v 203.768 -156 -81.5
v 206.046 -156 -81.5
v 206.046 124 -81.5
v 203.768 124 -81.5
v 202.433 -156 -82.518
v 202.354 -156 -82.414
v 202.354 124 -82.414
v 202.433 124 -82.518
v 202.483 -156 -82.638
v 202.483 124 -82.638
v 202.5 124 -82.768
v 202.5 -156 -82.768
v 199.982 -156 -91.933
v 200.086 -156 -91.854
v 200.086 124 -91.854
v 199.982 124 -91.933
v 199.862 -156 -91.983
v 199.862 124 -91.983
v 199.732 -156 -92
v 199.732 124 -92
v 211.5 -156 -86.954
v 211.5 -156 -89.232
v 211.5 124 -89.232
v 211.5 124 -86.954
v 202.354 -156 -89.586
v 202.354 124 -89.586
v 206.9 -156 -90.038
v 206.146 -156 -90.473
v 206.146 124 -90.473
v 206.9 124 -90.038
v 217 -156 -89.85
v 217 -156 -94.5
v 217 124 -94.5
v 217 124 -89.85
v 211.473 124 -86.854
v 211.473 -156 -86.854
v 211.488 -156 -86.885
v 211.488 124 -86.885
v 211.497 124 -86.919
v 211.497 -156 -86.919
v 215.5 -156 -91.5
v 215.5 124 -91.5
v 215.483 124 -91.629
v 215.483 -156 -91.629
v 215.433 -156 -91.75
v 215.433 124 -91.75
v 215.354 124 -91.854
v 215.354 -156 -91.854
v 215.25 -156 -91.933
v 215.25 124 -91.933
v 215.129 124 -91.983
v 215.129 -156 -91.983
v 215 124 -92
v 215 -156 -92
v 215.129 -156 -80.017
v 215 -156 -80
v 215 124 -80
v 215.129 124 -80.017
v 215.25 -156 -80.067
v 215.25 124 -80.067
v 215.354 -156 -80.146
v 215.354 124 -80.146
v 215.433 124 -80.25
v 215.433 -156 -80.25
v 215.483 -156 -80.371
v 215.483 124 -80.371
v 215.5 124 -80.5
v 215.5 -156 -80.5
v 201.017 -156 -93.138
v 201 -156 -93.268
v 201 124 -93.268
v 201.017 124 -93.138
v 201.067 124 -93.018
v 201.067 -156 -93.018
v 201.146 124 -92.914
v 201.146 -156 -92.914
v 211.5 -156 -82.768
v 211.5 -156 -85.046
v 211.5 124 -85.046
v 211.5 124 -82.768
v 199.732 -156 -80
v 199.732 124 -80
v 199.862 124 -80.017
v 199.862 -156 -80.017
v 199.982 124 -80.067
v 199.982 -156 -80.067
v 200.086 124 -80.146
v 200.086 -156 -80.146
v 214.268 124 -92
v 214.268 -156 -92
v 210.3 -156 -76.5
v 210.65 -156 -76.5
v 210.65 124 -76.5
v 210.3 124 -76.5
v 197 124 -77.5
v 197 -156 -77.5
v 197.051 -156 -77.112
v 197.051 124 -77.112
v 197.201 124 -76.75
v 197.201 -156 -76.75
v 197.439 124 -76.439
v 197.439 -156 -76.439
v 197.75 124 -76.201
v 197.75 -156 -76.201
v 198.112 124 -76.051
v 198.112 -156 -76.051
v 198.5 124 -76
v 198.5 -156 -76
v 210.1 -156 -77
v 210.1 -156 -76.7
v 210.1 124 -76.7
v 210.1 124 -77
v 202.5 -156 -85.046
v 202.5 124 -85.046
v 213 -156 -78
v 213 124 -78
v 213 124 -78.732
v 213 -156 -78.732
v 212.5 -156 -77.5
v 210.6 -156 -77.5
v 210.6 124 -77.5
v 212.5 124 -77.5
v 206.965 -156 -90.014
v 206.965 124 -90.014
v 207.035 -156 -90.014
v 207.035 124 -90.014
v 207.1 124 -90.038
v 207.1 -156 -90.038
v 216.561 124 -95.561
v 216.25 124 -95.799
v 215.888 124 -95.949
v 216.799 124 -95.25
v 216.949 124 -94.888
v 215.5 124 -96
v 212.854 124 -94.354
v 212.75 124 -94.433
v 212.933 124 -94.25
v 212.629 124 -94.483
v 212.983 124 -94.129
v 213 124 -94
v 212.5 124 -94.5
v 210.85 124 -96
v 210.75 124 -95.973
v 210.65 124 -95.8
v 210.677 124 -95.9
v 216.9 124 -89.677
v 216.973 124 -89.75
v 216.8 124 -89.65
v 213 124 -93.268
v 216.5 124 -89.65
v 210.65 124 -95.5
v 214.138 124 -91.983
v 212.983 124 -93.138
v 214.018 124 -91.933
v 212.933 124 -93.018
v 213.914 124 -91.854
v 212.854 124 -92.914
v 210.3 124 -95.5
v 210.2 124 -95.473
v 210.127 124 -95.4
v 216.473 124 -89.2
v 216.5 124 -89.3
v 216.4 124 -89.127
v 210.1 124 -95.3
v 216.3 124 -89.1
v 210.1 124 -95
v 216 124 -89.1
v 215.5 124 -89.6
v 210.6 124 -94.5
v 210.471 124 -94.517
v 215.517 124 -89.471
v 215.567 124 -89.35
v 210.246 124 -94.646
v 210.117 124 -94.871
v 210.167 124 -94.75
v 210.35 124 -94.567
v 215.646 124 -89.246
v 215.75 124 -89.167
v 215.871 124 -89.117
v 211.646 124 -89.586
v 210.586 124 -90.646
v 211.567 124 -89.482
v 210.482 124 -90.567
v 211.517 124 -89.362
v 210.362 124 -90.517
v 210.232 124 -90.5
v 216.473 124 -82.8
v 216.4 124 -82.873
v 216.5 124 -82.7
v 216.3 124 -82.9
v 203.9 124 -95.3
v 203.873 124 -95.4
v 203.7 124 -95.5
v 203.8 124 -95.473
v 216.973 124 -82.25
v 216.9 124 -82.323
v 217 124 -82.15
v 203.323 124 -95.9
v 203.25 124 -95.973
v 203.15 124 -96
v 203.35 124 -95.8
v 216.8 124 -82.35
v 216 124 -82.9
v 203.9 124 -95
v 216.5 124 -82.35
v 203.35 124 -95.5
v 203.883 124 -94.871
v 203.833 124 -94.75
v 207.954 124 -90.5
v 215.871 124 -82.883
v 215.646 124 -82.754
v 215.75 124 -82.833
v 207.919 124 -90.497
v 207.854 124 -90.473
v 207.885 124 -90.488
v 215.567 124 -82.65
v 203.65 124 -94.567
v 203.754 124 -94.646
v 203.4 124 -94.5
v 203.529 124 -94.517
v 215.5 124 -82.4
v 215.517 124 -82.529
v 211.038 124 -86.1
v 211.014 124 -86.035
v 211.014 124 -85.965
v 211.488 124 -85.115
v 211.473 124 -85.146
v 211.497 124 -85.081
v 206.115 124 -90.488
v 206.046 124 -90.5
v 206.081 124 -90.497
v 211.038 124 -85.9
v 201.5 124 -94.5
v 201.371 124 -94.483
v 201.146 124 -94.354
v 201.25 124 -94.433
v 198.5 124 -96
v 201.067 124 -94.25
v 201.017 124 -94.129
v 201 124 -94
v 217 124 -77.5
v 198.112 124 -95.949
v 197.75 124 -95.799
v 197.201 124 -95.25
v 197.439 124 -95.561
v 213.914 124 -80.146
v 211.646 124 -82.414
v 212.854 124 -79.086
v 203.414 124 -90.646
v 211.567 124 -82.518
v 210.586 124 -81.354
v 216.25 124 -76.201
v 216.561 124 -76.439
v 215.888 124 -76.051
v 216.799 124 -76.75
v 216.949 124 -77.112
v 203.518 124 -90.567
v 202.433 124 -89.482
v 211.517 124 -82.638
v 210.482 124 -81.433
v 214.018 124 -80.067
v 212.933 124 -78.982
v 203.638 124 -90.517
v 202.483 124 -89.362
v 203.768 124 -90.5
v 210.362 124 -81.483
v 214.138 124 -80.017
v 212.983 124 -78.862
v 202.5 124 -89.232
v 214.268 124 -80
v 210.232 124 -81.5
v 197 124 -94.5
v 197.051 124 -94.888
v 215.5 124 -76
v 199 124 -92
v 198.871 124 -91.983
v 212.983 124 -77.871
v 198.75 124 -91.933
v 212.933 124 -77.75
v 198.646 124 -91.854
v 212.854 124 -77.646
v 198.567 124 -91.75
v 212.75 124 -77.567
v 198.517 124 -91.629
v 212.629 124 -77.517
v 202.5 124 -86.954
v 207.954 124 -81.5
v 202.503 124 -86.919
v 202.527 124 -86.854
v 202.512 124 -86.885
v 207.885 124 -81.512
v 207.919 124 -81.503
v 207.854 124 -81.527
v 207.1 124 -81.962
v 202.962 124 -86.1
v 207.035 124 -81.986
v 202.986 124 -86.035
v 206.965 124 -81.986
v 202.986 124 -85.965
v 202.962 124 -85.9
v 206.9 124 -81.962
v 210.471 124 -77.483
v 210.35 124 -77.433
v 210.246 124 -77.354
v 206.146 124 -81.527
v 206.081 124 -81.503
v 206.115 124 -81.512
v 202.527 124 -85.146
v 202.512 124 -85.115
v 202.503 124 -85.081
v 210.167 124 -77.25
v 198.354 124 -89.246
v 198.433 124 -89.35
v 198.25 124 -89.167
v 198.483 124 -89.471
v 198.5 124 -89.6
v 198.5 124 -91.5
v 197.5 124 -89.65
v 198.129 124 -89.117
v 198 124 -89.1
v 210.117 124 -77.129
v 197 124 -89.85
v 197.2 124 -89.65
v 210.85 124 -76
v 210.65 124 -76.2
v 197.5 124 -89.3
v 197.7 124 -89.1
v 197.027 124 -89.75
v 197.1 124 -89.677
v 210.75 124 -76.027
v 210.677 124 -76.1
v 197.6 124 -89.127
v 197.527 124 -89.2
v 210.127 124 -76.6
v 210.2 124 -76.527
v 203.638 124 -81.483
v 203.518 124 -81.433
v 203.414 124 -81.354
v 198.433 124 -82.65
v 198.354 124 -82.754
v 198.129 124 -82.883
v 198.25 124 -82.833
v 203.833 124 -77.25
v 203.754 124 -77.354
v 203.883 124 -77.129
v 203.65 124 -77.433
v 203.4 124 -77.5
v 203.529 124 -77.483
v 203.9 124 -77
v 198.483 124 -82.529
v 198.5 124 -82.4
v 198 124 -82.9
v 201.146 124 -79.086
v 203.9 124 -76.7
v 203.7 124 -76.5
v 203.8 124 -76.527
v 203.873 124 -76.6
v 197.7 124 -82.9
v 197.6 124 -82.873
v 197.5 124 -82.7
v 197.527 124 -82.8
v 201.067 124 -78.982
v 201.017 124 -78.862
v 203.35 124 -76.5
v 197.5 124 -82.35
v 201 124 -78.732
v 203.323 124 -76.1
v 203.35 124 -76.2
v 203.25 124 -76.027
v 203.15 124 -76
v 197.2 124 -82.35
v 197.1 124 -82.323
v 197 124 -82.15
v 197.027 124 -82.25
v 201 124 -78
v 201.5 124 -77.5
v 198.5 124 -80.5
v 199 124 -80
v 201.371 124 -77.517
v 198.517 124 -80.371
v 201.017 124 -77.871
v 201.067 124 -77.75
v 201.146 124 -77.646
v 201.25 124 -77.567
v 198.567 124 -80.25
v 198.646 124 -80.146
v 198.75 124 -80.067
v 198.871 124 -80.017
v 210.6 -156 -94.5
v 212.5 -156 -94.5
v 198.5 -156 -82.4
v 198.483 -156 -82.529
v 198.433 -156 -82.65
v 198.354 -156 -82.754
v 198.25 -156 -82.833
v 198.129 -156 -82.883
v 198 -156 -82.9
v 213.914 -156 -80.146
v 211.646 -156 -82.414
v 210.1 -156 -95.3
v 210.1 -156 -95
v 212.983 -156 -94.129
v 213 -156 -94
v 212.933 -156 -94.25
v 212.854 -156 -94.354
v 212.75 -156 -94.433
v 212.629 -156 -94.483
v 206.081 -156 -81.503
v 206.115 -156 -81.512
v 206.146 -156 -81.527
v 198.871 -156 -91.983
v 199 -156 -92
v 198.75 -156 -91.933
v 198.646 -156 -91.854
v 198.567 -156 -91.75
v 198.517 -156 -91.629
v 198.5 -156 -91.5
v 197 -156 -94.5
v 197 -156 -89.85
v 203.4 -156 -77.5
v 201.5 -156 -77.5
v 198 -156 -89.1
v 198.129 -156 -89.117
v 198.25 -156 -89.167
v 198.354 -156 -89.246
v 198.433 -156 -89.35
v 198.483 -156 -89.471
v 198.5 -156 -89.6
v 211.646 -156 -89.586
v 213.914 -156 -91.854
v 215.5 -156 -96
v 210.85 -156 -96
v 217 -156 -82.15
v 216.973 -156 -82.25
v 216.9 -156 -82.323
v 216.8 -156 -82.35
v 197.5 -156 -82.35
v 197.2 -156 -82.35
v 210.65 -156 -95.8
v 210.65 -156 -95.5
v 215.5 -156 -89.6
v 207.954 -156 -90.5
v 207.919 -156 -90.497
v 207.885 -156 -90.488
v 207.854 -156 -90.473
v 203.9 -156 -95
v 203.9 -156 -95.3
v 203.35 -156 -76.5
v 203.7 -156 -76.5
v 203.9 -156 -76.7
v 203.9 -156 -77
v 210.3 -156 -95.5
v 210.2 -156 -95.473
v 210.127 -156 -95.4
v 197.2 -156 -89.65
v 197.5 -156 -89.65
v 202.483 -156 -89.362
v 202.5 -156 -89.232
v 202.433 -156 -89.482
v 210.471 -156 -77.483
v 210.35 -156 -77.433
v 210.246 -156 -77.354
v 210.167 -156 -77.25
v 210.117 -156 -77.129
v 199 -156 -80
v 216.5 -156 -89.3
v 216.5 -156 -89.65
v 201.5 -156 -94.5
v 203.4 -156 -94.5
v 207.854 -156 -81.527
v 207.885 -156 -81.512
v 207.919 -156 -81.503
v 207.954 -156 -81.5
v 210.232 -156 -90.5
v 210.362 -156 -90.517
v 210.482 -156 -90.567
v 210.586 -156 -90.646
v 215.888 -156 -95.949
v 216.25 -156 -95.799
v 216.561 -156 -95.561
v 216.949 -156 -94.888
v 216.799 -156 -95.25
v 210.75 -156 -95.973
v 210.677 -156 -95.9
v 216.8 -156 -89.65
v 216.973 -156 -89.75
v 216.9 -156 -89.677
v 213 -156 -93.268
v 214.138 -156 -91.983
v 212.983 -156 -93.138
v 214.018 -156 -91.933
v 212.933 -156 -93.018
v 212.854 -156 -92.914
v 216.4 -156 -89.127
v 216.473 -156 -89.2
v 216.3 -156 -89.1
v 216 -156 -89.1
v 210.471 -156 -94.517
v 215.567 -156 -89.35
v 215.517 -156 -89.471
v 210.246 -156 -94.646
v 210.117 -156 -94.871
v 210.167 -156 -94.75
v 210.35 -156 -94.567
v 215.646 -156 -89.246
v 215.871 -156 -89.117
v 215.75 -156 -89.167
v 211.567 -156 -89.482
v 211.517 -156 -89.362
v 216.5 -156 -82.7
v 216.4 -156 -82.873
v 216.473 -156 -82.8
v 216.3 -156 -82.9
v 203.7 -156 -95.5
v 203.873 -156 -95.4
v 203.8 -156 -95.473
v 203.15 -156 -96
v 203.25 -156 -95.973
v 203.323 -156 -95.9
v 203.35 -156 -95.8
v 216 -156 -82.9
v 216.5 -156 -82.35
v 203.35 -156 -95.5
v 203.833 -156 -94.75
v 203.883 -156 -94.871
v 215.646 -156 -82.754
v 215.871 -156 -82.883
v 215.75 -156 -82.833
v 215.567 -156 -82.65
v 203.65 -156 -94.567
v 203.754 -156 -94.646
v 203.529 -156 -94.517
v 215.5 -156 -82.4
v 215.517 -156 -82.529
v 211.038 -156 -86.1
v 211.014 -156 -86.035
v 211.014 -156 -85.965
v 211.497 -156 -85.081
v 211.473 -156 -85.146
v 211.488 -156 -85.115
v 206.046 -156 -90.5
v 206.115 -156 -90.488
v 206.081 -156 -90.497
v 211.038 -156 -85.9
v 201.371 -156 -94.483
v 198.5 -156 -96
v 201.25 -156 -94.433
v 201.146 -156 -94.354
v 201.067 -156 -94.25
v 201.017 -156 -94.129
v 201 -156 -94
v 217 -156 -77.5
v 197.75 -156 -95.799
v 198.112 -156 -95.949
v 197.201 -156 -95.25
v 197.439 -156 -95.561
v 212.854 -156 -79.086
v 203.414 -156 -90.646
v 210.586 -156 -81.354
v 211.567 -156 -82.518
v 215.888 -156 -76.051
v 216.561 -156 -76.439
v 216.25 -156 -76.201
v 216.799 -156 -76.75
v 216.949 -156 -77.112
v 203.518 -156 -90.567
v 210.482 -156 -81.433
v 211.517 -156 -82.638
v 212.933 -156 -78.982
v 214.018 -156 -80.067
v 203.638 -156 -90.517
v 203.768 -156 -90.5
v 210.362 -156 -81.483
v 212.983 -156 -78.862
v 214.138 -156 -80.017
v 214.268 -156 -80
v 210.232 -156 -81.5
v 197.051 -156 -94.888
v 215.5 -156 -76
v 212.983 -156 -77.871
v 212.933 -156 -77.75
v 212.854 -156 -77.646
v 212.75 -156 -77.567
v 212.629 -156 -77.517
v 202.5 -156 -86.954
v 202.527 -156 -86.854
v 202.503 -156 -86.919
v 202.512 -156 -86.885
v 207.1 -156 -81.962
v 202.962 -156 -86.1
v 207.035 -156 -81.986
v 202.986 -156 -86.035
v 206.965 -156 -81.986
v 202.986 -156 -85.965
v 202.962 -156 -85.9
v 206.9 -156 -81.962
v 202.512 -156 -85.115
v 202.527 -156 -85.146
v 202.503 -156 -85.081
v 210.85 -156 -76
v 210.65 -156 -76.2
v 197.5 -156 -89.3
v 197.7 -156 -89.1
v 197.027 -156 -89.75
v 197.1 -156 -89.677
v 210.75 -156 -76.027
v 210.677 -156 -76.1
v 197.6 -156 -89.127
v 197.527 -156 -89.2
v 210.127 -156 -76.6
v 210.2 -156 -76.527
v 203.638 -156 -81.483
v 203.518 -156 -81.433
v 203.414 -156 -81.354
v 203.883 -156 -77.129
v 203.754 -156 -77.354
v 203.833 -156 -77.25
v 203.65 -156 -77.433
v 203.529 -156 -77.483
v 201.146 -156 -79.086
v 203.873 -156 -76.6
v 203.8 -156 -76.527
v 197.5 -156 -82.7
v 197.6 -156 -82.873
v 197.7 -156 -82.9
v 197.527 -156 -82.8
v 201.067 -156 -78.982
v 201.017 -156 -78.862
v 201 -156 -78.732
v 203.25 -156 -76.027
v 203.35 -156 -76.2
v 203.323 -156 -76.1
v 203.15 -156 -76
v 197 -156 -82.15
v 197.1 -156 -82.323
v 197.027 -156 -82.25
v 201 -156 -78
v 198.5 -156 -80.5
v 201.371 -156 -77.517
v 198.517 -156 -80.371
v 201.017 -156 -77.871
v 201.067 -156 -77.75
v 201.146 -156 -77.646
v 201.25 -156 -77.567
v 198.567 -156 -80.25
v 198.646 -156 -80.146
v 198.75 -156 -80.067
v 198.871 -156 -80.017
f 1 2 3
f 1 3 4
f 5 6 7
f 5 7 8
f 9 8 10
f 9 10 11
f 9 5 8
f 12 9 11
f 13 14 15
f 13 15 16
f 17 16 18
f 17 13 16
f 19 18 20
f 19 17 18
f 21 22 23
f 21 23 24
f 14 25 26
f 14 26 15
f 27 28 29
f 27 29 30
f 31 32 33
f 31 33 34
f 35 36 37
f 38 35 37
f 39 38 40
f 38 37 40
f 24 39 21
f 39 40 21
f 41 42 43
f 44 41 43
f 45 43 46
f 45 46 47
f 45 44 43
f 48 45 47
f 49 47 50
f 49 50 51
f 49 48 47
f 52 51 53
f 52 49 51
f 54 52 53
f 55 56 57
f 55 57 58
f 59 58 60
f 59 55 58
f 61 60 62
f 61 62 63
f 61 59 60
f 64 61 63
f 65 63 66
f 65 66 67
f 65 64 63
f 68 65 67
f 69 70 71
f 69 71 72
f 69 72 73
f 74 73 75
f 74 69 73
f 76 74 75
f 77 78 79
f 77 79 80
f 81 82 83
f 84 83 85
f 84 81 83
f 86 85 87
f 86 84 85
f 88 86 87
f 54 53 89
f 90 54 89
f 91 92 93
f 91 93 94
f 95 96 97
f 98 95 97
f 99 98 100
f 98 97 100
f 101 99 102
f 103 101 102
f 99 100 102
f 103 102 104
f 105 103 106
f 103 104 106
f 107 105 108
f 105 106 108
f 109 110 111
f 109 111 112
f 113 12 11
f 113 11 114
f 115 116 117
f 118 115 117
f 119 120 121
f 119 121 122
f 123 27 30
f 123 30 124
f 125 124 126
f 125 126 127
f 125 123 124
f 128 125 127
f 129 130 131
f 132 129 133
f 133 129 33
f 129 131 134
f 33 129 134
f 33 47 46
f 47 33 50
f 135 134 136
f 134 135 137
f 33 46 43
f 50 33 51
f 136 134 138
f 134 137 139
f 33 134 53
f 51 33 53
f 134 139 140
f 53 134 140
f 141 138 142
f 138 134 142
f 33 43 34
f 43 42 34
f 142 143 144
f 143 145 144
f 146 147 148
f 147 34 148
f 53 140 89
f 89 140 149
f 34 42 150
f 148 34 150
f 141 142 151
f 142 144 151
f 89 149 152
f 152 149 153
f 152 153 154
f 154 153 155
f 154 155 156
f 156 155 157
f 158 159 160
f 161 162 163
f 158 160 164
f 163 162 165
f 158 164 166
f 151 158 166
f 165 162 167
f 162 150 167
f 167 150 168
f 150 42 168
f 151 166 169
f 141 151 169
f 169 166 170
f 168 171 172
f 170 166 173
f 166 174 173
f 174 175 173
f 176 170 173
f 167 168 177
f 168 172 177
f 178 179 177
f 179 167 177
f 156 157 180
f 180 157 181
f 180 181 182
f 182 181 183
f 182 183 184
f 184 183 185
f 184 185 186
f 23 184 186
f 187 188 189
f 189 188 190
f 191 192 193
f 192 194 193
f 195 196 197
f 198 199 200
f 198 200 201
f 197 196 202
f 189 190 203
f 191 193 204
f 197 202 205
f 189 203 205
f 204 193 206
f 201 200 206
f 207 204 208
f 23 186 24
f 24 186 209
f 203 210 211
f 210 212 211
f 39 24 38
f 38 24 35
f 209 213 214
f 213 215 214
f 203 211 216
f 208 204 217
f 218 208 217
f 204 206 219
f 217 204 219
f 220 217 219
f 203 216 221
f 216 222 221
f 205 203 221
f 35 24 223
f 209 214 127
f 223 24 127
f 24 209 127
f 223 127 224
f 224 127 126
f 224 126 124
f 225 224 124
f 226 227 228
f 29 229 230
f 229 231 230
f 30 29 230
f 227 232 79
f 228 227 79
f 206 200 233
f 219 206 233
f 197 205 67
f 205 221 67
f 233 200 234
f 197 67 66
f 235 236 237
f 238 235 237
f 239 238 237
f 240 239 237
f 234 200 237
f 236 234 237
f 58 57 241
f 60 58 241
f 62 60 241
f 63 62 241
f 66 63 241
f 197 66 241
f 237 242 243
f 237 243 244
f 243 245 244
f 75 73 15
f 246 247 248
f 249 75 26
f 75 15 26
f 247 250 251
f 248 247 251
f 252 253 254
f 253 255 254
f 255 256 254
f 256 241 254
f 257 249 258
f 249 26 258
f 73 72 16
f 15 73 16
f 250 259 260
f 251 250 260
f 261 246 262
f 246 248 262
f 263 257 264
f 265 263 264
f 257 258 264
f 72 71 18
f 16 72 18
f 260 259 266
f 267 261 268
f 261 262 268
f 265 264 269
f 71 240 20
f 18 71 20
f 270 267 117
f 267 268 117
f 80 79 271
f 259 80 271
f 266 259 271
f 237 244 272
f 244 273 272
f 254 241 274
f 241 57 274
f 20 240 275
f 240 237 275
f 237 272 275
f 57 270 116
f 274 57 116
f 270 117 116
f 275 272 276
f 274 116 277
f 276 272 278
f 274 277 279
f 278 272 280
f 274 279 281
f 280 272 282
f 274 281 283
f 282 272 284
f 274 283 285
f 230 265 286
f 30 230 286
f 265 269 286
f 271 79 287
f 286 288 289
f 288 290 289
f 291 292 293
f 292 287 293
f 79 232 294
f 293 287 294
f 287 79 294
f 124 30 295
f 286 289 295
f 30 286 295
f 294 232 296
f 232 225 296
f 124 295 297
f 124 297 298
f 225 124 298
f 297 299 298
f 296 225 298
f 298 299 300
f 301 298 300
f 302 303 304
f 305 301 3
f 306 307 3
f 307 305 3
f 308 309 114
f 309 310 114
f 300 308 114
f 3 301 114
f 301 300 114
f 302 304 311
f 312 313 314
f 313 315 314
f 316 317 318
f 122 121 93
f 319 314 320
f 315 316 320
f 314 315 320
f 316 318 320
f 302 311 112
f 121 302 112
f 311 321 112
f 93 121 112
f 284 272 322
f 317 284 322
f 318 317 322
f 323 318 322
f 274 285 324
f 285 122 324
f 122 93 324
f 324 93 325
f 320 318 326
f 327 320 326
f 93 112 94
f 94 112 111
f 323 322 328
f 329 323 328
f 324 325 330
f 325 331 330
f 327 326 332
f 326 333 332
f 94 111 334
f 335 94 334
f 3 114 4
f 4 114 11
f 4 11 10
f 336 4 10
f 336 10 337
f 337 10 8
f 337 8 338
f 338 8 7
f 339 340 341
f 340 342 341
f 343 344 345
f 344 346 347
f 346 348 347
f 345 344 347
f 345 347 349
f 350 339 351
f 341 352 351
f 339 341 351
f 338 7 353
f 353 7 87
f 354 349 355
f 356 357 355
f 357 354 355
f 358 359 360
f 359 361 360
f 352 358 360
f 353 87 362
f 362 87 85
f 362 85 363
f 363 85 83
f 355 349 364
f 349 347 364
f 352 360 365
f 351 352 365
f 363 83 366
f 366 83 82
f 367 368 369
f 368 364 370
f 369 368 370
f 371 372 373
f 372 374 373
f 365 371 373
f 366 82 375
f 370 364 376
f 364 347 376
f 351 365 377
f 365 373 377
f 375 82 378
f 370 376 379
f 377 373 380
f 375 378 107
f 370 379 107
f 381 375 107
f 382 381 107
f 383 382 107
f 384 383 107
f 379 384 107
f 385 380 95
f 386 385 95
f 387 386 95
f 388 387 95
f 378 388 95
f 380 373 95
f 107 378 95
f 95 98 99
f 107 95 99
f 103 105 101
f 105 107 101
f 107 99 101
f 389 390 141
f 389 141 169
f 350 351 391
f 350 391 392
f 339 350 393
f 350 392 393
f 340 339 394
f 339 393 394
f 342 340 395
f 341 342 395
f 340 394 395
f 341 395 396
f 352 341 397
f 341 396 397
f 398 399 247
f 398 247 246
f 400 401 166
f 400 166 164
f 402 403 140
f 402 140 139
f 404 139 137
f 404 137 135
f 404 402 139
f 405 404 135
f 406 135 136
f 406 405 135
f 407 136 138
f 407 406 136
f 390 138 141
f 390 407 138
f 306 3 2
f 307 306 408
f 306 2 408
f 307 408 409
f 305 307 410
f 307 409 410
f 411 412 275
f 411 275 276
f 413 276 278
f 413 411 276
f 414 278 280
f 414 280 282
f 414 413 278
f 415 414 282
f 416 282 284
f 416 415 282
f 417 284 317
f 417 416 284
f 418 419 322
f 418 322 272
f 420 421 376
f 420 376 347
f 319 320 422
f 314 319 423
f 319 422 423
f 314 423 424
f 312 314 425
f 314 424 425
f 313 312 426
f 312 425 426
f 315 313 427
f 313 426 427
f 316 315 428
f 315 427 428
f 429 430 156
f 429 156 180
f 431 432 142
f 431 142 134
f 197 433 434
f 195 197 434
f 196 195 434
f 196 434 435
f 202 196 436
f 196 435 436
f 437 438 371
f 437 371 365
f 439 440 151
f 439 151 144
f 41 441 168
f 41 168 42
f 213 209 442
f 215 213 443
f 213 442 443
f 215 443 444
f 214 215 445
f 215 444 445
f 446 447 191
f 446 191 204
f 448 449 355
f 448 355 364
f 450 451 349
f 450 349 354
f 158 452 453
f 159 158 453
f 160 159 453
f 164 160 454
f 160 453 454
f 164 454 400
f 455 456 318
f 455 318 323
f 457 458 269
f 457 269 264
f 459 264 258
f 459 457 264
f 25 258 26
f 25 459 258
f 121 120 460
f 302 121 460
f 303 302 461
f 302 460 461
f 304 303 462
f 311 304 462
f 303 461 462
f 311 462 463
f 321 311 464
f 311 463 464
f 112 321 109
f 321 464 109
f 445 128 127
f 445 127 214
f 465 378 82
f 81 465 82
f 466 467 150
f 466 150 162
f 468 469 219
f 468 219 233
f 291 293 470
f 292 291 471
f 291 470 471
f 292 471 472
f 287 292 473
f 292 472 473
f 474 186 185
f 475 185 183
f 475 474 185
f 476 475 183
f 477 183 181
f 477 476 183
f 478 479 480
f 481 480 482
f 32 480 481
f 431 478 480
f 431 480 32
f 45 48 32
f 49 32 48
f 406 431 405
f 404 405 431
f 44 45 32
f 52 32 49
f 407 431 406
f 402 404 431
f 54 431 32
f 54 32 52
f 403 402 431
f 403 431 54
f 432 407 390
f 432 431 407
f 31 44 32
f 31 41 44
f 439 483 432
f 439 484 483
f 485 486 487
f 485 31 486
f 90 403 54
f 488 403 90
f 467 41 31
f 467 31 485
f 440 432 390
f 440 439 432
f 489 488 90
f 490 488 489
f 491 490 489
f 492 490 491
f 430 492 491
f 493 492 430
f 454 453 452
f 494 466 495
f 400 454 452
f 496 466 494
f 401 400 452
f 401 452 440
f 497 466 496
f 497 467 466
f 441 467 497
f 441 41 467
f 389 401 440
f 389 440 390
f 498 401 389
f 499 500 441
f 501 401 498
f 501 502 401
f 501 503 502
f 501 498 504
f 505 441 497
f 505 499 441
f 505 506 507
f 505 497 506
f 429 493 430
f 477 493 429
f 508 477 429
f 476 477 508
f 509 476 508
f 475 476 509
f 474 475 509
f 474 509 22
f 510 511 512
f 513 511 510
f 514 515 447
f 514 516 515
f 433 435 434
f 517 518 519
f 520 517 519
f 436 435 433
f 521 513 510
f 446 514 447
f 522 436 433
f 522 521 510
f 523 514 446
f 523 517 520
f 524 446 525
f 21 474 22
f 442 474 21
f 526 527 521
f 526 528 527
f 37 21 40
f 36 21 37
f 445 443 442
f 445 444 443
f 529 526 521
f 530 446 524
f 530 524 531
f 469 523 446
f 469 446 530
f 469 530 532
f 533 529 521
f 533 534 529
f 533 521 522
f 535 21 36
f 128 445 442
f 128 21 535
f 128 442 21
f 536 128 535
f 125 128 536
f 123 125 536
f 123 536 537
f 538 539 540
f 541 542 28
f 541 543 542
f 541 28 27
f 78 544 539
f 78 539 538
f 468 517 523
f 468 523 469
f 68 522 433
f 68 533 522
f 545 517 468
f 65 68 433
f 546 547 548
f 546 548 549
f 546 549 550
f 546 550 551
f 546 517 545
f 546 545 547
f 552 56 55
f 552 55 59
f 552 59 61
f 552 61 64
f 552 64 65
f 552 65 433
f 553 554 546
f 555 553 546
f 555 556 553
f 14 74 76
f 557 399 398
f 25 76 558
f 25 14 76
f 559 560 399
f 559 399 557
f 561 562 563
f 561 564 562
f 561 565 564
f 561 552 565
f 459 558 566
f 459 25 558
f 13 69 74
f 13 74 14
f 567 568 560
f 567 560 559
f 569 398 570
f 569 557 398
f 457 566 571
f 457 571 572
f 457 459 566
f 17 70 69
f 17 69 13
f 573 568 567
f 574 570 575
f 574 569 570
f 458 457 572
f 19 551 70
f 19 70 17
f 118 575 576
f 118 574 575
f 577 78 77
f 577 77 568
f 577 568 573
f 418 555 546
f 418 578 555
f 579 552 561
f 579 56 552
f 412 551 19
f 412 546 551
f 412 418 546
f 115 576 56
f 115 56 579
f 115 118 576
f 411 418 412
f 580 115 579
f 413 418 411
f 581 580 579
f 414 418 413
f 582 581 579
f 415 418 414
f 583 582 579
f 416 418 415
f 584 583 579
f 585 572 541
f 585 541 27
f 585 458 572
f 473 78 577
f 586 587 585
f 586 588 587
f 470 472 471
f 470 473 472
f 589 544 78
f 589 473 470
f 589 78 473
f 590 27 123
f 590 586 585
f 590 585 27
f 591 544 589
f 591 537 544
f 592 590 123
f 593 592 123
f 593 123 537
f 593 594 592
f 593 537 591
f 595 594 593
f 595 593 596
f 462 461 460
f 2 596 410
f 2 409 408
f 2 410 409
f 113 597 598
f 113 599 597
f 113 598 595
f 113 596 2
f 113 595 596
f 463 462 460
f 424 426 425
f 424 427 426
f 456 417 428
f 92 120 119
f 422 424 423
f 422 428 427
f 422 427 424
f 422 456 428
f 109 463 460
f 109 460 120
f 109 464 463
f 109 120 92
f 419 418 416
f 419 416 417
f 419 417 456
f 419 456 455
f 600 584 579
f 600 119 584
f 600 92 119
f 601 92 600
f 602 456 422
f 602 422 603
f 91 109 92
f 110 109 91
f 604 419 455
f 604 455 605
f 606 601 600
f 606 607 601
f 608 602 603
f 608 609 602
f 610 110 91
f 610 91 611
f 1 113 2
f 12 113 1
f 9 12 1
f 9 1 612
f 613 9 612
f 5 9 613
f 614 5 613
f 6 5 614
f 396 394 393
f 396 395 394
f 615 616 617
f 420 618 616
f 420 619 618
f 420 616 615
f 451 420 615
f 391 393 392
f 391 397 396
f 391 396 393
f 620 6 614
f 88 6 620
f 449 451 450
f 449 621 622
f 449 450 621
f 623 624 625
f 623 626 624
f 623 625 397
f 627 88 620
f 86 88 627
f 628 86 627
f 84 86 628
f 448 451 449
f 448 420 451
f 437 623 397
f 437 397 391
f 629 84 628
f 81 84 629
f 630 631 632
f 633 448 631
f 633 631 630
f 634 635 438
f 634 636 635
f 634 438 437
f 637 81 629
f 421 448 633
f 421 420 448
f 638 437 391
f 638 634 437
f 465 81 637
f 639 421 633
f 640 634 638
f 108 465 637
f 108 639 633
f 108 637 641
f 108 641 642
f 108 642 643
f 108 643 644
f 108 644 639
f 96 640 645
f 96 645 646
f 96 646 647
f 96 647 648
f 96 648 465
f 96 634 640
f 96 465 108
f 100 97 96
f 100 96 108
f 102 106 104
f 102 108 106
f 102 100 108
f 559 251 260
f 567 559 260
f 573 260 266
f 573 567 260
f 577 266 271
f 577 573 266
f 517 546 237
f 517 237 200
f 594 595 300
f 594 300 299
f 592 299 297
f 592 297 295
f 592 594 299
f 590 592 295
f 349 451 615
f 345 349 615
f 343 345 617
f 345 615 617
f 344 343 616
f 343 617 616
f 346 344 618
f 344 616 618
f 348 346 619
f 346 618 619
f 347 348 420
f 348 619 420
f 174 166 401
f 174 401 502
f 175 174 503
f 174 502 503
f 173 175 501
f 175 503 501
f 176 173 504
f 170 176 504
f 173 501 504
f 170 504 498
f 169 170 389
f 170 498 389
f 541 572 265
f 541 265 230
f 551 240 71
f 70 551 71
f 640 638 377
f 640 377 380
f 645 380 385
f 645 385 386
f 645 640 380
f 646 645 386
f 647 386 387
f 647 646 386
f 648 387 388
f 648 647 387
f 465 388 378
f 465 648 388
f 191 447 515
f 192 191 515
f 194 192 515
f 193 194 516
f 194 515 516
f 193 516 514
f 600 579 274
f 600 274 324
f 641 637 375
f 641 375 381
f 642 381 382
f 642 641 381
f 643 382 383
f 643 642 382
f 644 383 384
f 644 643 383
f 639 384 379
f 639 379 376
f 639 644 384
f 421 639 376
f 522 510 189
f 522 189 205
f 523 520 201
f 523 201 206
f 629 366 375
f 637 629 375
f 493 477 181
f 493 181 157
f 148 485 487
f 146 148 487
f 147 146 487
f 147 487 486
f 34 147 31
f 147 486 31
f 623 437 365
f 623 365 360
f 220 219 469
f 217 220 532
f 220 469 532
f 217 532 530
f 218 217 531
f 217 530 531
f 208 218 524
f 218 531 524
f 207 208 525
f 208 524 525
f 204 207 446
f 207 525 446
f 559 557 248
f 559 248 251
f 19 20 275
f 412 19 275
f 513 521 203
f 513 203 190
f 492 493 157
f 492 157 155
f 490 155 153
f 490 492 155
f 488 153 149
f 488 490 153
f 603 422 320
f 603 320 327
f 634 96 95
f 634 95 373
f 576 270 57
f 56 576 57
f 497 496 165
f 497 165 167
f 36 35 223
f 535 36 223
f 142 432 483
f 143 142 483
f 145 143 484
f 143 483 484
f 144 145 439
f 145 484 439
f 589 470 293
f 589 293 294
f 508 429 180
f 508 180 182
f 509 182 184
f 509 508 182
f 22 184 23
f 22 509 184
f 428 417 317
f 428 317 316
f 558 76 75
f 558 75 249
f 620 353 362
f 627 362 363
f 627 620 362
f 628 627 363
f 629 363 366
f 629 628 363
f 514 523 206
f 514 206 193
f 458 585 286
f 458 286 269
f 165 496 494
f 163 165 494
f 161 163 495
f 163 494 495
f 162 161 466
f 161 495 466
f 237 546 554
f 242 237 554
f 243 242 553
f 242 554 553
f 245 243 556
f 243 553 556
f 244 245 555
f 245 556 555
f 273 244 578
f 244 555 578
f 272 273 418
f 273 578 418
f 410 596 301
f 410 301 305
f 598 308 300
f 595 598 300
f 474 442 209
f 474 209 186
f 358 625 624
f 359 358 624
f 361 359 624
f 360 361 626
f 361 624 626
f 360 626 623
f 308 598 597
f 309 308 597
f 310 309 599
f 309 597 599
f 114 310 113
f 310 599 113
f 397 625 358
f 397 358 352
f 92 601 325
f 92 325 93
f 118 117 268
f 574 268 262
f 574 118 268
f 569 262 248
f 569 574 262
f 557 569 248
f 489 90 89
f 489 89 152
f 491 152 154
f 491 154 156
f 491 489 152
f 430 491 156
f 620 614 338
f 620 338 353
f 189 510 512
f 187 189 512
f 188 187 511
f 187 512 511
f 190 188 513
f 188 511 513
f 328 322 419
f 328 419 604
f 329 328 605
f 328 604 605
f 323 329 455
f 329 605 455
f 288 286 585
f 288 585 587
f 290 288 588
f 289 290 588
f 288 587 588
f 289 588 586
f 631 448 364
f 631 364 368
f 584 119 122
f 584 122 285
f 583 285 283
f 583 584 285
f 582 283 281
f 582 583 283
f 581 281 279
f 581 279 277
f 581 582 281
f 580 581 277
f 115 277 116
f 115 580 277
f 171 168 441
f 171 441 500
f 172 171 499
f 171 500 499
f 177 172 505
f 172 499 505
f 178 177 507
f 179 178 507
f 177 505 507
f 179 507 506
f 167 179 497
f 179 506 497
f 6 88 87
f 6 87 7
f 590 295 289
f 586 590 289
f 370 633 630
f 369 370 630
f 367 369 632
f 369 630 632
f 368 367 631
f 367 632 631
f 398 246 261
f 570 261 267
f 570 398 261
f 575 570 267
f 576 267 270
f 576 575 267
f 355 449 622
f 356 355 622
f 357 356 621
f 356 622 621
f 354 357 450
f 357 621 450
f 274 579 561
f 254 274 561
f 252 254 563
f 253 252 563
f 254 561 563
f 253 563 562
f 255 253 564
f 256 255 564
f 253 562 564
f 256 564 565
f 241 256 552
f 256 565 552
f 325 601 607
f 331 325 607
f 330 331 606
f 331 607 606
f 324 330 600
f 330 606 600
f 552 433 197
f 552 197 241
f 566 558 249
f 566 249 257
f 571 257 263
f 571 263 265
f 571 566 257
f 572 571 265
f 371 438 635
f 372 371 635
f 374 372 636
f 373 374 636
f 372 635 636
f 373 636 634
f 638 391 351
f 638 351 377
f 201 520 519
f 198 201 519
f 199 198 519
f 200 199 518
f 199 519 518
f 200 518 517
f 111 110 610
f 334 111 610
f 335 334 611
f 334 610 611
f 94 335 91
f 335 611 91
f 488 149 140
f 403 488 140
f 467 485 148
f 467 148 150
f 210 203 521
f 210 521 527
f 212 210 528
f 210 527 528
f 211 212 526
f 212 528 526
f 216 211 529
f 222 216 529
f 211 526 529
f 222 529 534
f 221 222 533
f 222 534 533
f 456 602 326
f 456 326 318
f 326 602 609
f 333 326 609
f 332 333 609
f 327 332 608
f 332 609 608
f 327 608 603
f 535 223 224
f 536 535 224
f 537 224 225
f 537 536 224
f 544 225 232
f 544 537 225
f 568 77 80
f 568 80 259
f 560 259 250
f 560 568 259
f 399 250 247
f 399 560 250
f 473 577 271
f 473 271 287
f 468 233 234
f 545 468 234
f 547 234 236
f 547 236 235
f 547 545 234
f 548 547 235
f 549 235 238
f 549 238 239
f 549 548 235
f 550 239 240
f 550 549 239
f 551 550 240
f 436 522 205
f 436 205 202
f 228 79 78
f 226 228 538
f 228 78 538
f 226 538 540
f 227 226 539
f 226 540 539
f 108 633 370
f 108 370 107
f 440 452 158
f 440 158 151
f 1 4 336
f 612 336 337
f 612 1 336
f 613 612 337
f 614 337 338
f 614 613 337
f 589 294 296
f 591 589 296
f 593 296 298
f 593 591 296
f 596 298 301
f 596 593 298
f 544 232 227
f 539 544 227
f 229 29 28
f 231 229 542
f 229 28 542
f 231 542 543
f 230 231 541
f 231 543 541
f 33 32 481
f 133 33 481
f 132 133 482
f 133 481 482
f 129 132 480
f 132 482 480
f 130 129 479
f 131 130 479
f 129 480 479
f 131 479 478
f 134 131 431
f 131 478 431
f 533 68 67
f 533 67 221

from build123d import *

# Parameters (mm, degrees)
PAD007_DEPTH    = 280
POCKET019_DEPTH = 280.001


with BuildPart() as pad007:
    # Sketch015 → Pad007 (new body)
    with BuildSketch(Plane(origin=(0, 0, -1.5), x_dir=(0, 0, -1), z_dir=(0, 1, 0))):
        with BuildLine():
            Line((0, 20), (4.65, 20))
            ThreePointArc((4.85, 19.8), (4.791421, 19.941421), (4.65, 20))
            Line((4.85, 19.8), (4.85, 19.5))
            Line((4.85, 19.5), (5.2, 19.5))
            ThreePointArc((5.4, 19.3), (5.341421, 19.441421), (5.2, 19.5))
            Line((5.4, 19.3), (5.4, 19))
            ThreePointArc((4.9, 18.5), (5.253553, 18.646446), (5.4, 19))
            Line((4.9, 18.5), (2.999999, 18.5))
            ThreePointArc((2.999999, 18.5), (2.646446, 18.353553), (2.499999, 18))
            Line((2.499999, 18), (2.499999, 17.267767))
            ThreePointArc((2.499999, 17.267767), (2.53806, 17.076425), (2.646446, 16.914213))
            Line((2.646446, 16.914213), (4.914213, 14.646447))
            ThreePointArc((4.914213, 14.646447), (5.076424, 14.53806), (5.267766, 14.5))
            Line((5.267766, 14.5), (7.54641, 14.5))
            ThreePointArc((7.64641, 14.473205), (7.598173, 14.493185), (7.54641, 14.5))
            Line((7.64641, 14.473205), (8.4, 14.03812))
            ThreePointArc((8.4, 14.03812), (8.5, 14.011325), (8.6, 14.03812))
            Line((8.6, 14.03812), (9.35359, 14.473205))
            ThreePointArc((9.45359, 14.5), (9.401827, 14.493185), (9.35359, 14.473205))
            Line((9.45359, 14.5), (11.732234, 14.5))
            ThreePointArc((11.732234, 14.5), (11.923576, 14.53806), (12.085787, 14.646447))
            Line((12.085787, 14.646447), (14.353554, 16.914213))
            ThreePointArc((14.353554, 16.914213), (14.46194, 17.076425), (14.500001, 17.267767))
            Line((14.500001, 17.267767), (14.500001, 18))
            ThreePointArc((14.500001, 18), (14.353554, 18.353553), (14.000001, 18.5))
            Line((14.000001, 18.5), (12.1, 18.5))
            ThreePointArc((11.6, 19), (11.746447, 18.646446), (12.1, 18.5))
            Line((11.6, 19), (11.6, 19.3))
            ThreePointArc((11.8, 19.5), (11.658579, 19.441421), (11.6, 19.3))
            Line((11.8, 19.5), (12.15, 19.5))
            Line((12.15, 19.5), (12.15, 19.8))
            ThreePointArc((12.35, 20), (12.208579, 19.941421), (12.15, 19.8))
            Line((12.35, 20), (17, 20))
            ThreePointArc((18.5, 18.5), (18.06066, 19.56066), (17, 20))
            Line((18.5, 18.5), (18.5, 13.85))
            ThreePointArc((18.3, 13.65), (18.441421, 13.708578), (18.5, 13.85))
            Line((18.3, 13.65), (18, 13.65))
            Line((18, 13.65), (18, 13.3))
            ThreePointArc((17.8, 13.1), (17.941421, 13.158579), (18, 13.3))
            Line((17.8, 13.1), (17.5, 13.1))
            ThreePointArc((17, 13.6), (17.146446, 13.246447), (17.5, 13.1))
            Line((17, 13.6), (17, 15.5))
            ThreePointArc((17, 15.5), (16.853553, 15.853553), (16.5, 16))
            Line((16.5, 16), (15.767767, 16))
            ThreePointArc((15.767767, 16), (15.576425, 15.961939), (15.414213, 15.853553))
            Line((15.414213, 15.853553), (13.146446, 13.585786))
            ThreePointArc((13.146446, 13.585786), (13.03806, 13.423574), (13, 13.232233))
            Line((13, 13.232233), (13, 10.953589))
            ThreePointArc((12.973205, 10.853589), (12.993185, 10.901825), (13, 10.953589))
            Line((12.973205, 10.853589), (12.53812, 10.1))
            ThreePointArc((12.53812, 10.1), (12.511325, 10), (12.53812, 9.9))
            Line((12.53812, 9.9), (12.973205, 9.146411))
            ThreePointArc((13, 9.046411), (12.993185, 9.098175), (12.973205, 9.146411))
            Line((13, 9.046411), (13, 6.767767))
            ThreePointArc((13, 6.767767), (13.03806, 6.576426), (13.146446, 6.414214))
            Line((13.146446, 6.414214), (15.414213, 4.146447))
            ThreePointArc((15.414213, 4.146447), (15.576425, 4.038061), (15.767767, 4))
            Line((15.767767, 4), (16.5, 4))
            ThreePointArc((16.5, 4), (16.853553, 4.146447), (17, 4.5))
            Line((17, 4.5), (17, 6.4))
            ThreePointArc((17.5, 6.9), (17.146446, 6.753553), (17, 6.4))
            Line((17.5, 6.9), (17.8, 6.9))
            ThreePointArc((18, 6.7), (17.941421, 6.841421), (17.8, 6.9))
            Line((18, 6.7), (18, 6.35))
            Line((18, 6.35), (18.3, 6.35))
            ThreePointArc((18.5, 6.15), (18.441421, 6.291422), (18.3, 6.35))
            Line((18.5, 6.15), (18.5, 1.5))
            ThreePointArc((17, 0), (18.06066, 0.43934), (18.5, 1.5))
            Line((17, 0), (12.35, 0))
            ThreePointArc((12.15, 0.2), (12.208579, 0.058579), (12.35, 0))
            Line((12.15, 0.2), (12.15, 0.5))
            Line((12.15, 0.5), (11.8, 0.5))
            ThreePointArc((11.6, 0.7), (11.658579, 0.558579), (11.8, 0.5))
            Line((11.6, 0.7), (11.6, 1))
            ThreePointArc((12.1, 1.5), (11.746447, 1.353554), (11.6, 1))
            Line((12.1, 1.5), (14.000001, 1.5))
            ThreePointArc((14.000001, 1.5), (14.353554, 1.646447), (14.500001, 2))
            Line((14.500001, 2), (14.500001, 2.732233))
            ThreePointArc((14.500001, 2.732233), (14.46194, 2.923575), (14.353554, 3.085787))
            Line((14.353554, 3.085787), (12.085787, 5.353553))
            ThreePointArc((12.085787, 5.353553), (11.923576, 5.46194), (11.732234, 5.5))
            Line((11.732234, 5.5), (9.45359, 5.5))
            ThreePointArc((9.35359, 5.526795), (9.401827, 5.506815), (9.45359, 5.5))
            Line((9.35359, 5.526795), (8.6, 5.96188))
            ThreePointArc((8.6, 5.96188), (8.5, 5.988675), (8.4, 5.96188))
            Line((8.4, 5.96188), (7.64641, 5.526795))
            ThreePointArc((7.54641, 5.5), (7.598173, 5.506815), (7.64641, 5.526795))
            Line((7.54641, 5.5), (5.267766, 5.5))
            ThreePointArc((5.267766, 5.5), (5.076424, 5.46194), (4.914213, 5.353553))
            Line((4.914213, 5.353553), (2.646446, 3.085787))
            ThreePointArc((2.646446, 3.085787), (2.53806, 2.923575), (2.499999, 2.732233))
            Line((2.499999, 2.732233), (2.499999, 2))
            ThreePointArc((2.499999, 2), (2.646446, 1.646447), (2.999999, 1.5))
            Line((2.999999, 1.5), (4.9, 1.5))
            ThreePointArc((5.4, 1), (5.253553, 1.353554), (4.9, 1.5))
            Line((5.4, 1), (5.4, 0.7))
            ThreePointArc((5.2, 0.5), (5.341421, 0.558579), (5.4, 0.7))
            Line((5.2, 0.5), (4.85, 0.5))
            Line((4.85, 0.5), (4.85, 0.2))
            ThreePointArc((4.65, 0), (4.791421, 0.058579), (4.85, 0.2))
            Line((4.65, 0), (0, 0))
            ThreePointArc((-1.5, 1.5), (-1.06066, 0.43934), (0, 0))
            Line((-1.5, 1.5), (-1.5, 6.15))
            ThreePointArc((-1.3, 6.35), (-1.441421, 6.291422), (-1.5, 6.15))
            Line((-1.3, 6.35), (-1, 6.35))
            Line((-1, 6.35), (-1, 6.7))
            ThreePointArc((-0.8, 6.9), (-0.941421, 6.841421), (-1, 6.7))
            Line((-0.8, 6.9), (-0.5, 6.9))
            ThreePointArc((0, 6.4), (-0.146446, 6.753553), (-0.5, 6.9))
            Line((0, 6.4), (0, 4.5))
            ThreePointArc((0, 4.5), (0.146447, 4.146447), (0.5, 4))
            Line((0.5, 4), (1.232233, 4))
            ThreePointArc((1.232233, 4), (1.423575, 4.038061), (1.585787, 4.146447))
            Line((1.585787, 4.146447), (3.853554, 6.414214))
            ThreePointArc((3.853554, 6.414214), (3.96194, 6.576426), (4, 6.767767))
            Line((4, 6.767767), (4, 9.046411))
            ThreePointArc((4.026795, 9.146411), (4.006815, 9.098175), (4, 9.046411))
            Line((4.026795, 9.146411), (4.46188, 9.9))
            ThreePointArc((4.46188, 9.9), (4.488675, 10), (4.46188, 10.1))
            Line((4.46188, 10.1), (4.026795, 10.853589))
            ThreePointArc((4, 10.953589), (4.006815, 10.901825), (4.026795, 10.853589))
            Line((4, 10.953589), (4, 13.232233))
            ThreePointArc((4, 13.232233), (3.96194, 13.423574), (3.853554, 13.585786))
            Line((3.853554, 13.585786), (1.585787, 15.853553))
            ThreePointArc((1.585787, 15.853553), (1.423575, 15.961939), (1.232233, 16))
            Line((1.232233, 16), (0.5, 16))
            ThreePointArc((0.5, 16), (0.146447, 15.853553), (0, 15.5))
            Line((0, 15.5), (0, 13.6))
            ThreePointArc((-0.5, 13.1), (-0.146446, 13.246447), (0, 13.6))
            Line((-0.5, 13.1), (-0.8, 13.1))
            ThreePointArc((-1, 13.3), (-0.941421, 13.158579), (-0.8, 13.1))
            Line((-1, 13.3), (-1, 13.65))
            Line((-1, 13.65), (-1.3, 13.65))
            ThreePointArc((-1.5, 13.85), (-1.441421, 13.708578), (-1.3, 13.65))
            Line((-1.5, 13.85), (-1.5, 18.5))
            ThreePointArc((0, 20), (-1.06066, 19.56066), (-1.5, 18.5))
        make_face()
    extrude(amount=PAD007_DEPTH)


with BuildPart() as fusion009:
    # Pocket019 base: copy of Pad007
    add(pad007.part)

    # Sketch016 → Pocket019 (cut, through all)
    with BuildSketch(Plane(origin=(0, 280, -1.5), x_dir=(0, 0, -1), z_dir=(0, 1, 0))):
        with BuildLine():
            ThreePointArc((6.586105, 12.989641), (5.988263, 12.50841), (5.507825, 11.909931))
            Line((6.054705, 11.258185), (5.507825, 11.909931))
            ThreePointArc((6.054705, 11.258185), (5.75, 10), (6.054705, 8.741815))
            Line((5.507825, 8.090069), (6.054705, 8.741815))
            ThreePointArc((5.507825, 8.090069), (5.988263, 7.49159), (6.586105, 7.010359))
            Line((7.241815, 7.554705), (6.586105, 7.010359))
            ThreePointArc((7.241815, 7.554705), (8.5, 7.25), (9.758185, 7.554705))
            Line((10.413895, 7.010359), (9.758185, 7.554705))
            ThreePointArc((10.413895, 7.010359), (11.011737, 7.49159), (11.492175, 8.090069))
            Line((10.945295, 8.741815), (11.492175, 8.090069))
            ThreePointArc((10.945295, 8.741815), (11.25, 10), (10.945295, 11.258185))
            Line((11.492175, 11.909931), (10.945295, 11.258185))
            ThreePointArc((11.492175, 11.909931), (11.011737, 12.50841), (10.413895, 12.989641))
            Line((9.758185, 12.445295), (10.413895, 12.989641))
            ThreePointArc((9.758185, 12.445295), (8.5, 12.75), (7.241815, 12.445295))
            Line((6.586105, 12.989641), (7.241815, 12.445295))
        make_face()
    extrude(amount=-POCKET019_DEPTH, mode=Mode.SUBTRACT)

    # Fusion009: union Pad007
    add(pad007.part)


with BuildPart() as fusion009_1:
    # Fusion009 placement: moved
    add(fusion009.part.moved(Location((217, -156, -76))))


solid = fusion009_1.part
